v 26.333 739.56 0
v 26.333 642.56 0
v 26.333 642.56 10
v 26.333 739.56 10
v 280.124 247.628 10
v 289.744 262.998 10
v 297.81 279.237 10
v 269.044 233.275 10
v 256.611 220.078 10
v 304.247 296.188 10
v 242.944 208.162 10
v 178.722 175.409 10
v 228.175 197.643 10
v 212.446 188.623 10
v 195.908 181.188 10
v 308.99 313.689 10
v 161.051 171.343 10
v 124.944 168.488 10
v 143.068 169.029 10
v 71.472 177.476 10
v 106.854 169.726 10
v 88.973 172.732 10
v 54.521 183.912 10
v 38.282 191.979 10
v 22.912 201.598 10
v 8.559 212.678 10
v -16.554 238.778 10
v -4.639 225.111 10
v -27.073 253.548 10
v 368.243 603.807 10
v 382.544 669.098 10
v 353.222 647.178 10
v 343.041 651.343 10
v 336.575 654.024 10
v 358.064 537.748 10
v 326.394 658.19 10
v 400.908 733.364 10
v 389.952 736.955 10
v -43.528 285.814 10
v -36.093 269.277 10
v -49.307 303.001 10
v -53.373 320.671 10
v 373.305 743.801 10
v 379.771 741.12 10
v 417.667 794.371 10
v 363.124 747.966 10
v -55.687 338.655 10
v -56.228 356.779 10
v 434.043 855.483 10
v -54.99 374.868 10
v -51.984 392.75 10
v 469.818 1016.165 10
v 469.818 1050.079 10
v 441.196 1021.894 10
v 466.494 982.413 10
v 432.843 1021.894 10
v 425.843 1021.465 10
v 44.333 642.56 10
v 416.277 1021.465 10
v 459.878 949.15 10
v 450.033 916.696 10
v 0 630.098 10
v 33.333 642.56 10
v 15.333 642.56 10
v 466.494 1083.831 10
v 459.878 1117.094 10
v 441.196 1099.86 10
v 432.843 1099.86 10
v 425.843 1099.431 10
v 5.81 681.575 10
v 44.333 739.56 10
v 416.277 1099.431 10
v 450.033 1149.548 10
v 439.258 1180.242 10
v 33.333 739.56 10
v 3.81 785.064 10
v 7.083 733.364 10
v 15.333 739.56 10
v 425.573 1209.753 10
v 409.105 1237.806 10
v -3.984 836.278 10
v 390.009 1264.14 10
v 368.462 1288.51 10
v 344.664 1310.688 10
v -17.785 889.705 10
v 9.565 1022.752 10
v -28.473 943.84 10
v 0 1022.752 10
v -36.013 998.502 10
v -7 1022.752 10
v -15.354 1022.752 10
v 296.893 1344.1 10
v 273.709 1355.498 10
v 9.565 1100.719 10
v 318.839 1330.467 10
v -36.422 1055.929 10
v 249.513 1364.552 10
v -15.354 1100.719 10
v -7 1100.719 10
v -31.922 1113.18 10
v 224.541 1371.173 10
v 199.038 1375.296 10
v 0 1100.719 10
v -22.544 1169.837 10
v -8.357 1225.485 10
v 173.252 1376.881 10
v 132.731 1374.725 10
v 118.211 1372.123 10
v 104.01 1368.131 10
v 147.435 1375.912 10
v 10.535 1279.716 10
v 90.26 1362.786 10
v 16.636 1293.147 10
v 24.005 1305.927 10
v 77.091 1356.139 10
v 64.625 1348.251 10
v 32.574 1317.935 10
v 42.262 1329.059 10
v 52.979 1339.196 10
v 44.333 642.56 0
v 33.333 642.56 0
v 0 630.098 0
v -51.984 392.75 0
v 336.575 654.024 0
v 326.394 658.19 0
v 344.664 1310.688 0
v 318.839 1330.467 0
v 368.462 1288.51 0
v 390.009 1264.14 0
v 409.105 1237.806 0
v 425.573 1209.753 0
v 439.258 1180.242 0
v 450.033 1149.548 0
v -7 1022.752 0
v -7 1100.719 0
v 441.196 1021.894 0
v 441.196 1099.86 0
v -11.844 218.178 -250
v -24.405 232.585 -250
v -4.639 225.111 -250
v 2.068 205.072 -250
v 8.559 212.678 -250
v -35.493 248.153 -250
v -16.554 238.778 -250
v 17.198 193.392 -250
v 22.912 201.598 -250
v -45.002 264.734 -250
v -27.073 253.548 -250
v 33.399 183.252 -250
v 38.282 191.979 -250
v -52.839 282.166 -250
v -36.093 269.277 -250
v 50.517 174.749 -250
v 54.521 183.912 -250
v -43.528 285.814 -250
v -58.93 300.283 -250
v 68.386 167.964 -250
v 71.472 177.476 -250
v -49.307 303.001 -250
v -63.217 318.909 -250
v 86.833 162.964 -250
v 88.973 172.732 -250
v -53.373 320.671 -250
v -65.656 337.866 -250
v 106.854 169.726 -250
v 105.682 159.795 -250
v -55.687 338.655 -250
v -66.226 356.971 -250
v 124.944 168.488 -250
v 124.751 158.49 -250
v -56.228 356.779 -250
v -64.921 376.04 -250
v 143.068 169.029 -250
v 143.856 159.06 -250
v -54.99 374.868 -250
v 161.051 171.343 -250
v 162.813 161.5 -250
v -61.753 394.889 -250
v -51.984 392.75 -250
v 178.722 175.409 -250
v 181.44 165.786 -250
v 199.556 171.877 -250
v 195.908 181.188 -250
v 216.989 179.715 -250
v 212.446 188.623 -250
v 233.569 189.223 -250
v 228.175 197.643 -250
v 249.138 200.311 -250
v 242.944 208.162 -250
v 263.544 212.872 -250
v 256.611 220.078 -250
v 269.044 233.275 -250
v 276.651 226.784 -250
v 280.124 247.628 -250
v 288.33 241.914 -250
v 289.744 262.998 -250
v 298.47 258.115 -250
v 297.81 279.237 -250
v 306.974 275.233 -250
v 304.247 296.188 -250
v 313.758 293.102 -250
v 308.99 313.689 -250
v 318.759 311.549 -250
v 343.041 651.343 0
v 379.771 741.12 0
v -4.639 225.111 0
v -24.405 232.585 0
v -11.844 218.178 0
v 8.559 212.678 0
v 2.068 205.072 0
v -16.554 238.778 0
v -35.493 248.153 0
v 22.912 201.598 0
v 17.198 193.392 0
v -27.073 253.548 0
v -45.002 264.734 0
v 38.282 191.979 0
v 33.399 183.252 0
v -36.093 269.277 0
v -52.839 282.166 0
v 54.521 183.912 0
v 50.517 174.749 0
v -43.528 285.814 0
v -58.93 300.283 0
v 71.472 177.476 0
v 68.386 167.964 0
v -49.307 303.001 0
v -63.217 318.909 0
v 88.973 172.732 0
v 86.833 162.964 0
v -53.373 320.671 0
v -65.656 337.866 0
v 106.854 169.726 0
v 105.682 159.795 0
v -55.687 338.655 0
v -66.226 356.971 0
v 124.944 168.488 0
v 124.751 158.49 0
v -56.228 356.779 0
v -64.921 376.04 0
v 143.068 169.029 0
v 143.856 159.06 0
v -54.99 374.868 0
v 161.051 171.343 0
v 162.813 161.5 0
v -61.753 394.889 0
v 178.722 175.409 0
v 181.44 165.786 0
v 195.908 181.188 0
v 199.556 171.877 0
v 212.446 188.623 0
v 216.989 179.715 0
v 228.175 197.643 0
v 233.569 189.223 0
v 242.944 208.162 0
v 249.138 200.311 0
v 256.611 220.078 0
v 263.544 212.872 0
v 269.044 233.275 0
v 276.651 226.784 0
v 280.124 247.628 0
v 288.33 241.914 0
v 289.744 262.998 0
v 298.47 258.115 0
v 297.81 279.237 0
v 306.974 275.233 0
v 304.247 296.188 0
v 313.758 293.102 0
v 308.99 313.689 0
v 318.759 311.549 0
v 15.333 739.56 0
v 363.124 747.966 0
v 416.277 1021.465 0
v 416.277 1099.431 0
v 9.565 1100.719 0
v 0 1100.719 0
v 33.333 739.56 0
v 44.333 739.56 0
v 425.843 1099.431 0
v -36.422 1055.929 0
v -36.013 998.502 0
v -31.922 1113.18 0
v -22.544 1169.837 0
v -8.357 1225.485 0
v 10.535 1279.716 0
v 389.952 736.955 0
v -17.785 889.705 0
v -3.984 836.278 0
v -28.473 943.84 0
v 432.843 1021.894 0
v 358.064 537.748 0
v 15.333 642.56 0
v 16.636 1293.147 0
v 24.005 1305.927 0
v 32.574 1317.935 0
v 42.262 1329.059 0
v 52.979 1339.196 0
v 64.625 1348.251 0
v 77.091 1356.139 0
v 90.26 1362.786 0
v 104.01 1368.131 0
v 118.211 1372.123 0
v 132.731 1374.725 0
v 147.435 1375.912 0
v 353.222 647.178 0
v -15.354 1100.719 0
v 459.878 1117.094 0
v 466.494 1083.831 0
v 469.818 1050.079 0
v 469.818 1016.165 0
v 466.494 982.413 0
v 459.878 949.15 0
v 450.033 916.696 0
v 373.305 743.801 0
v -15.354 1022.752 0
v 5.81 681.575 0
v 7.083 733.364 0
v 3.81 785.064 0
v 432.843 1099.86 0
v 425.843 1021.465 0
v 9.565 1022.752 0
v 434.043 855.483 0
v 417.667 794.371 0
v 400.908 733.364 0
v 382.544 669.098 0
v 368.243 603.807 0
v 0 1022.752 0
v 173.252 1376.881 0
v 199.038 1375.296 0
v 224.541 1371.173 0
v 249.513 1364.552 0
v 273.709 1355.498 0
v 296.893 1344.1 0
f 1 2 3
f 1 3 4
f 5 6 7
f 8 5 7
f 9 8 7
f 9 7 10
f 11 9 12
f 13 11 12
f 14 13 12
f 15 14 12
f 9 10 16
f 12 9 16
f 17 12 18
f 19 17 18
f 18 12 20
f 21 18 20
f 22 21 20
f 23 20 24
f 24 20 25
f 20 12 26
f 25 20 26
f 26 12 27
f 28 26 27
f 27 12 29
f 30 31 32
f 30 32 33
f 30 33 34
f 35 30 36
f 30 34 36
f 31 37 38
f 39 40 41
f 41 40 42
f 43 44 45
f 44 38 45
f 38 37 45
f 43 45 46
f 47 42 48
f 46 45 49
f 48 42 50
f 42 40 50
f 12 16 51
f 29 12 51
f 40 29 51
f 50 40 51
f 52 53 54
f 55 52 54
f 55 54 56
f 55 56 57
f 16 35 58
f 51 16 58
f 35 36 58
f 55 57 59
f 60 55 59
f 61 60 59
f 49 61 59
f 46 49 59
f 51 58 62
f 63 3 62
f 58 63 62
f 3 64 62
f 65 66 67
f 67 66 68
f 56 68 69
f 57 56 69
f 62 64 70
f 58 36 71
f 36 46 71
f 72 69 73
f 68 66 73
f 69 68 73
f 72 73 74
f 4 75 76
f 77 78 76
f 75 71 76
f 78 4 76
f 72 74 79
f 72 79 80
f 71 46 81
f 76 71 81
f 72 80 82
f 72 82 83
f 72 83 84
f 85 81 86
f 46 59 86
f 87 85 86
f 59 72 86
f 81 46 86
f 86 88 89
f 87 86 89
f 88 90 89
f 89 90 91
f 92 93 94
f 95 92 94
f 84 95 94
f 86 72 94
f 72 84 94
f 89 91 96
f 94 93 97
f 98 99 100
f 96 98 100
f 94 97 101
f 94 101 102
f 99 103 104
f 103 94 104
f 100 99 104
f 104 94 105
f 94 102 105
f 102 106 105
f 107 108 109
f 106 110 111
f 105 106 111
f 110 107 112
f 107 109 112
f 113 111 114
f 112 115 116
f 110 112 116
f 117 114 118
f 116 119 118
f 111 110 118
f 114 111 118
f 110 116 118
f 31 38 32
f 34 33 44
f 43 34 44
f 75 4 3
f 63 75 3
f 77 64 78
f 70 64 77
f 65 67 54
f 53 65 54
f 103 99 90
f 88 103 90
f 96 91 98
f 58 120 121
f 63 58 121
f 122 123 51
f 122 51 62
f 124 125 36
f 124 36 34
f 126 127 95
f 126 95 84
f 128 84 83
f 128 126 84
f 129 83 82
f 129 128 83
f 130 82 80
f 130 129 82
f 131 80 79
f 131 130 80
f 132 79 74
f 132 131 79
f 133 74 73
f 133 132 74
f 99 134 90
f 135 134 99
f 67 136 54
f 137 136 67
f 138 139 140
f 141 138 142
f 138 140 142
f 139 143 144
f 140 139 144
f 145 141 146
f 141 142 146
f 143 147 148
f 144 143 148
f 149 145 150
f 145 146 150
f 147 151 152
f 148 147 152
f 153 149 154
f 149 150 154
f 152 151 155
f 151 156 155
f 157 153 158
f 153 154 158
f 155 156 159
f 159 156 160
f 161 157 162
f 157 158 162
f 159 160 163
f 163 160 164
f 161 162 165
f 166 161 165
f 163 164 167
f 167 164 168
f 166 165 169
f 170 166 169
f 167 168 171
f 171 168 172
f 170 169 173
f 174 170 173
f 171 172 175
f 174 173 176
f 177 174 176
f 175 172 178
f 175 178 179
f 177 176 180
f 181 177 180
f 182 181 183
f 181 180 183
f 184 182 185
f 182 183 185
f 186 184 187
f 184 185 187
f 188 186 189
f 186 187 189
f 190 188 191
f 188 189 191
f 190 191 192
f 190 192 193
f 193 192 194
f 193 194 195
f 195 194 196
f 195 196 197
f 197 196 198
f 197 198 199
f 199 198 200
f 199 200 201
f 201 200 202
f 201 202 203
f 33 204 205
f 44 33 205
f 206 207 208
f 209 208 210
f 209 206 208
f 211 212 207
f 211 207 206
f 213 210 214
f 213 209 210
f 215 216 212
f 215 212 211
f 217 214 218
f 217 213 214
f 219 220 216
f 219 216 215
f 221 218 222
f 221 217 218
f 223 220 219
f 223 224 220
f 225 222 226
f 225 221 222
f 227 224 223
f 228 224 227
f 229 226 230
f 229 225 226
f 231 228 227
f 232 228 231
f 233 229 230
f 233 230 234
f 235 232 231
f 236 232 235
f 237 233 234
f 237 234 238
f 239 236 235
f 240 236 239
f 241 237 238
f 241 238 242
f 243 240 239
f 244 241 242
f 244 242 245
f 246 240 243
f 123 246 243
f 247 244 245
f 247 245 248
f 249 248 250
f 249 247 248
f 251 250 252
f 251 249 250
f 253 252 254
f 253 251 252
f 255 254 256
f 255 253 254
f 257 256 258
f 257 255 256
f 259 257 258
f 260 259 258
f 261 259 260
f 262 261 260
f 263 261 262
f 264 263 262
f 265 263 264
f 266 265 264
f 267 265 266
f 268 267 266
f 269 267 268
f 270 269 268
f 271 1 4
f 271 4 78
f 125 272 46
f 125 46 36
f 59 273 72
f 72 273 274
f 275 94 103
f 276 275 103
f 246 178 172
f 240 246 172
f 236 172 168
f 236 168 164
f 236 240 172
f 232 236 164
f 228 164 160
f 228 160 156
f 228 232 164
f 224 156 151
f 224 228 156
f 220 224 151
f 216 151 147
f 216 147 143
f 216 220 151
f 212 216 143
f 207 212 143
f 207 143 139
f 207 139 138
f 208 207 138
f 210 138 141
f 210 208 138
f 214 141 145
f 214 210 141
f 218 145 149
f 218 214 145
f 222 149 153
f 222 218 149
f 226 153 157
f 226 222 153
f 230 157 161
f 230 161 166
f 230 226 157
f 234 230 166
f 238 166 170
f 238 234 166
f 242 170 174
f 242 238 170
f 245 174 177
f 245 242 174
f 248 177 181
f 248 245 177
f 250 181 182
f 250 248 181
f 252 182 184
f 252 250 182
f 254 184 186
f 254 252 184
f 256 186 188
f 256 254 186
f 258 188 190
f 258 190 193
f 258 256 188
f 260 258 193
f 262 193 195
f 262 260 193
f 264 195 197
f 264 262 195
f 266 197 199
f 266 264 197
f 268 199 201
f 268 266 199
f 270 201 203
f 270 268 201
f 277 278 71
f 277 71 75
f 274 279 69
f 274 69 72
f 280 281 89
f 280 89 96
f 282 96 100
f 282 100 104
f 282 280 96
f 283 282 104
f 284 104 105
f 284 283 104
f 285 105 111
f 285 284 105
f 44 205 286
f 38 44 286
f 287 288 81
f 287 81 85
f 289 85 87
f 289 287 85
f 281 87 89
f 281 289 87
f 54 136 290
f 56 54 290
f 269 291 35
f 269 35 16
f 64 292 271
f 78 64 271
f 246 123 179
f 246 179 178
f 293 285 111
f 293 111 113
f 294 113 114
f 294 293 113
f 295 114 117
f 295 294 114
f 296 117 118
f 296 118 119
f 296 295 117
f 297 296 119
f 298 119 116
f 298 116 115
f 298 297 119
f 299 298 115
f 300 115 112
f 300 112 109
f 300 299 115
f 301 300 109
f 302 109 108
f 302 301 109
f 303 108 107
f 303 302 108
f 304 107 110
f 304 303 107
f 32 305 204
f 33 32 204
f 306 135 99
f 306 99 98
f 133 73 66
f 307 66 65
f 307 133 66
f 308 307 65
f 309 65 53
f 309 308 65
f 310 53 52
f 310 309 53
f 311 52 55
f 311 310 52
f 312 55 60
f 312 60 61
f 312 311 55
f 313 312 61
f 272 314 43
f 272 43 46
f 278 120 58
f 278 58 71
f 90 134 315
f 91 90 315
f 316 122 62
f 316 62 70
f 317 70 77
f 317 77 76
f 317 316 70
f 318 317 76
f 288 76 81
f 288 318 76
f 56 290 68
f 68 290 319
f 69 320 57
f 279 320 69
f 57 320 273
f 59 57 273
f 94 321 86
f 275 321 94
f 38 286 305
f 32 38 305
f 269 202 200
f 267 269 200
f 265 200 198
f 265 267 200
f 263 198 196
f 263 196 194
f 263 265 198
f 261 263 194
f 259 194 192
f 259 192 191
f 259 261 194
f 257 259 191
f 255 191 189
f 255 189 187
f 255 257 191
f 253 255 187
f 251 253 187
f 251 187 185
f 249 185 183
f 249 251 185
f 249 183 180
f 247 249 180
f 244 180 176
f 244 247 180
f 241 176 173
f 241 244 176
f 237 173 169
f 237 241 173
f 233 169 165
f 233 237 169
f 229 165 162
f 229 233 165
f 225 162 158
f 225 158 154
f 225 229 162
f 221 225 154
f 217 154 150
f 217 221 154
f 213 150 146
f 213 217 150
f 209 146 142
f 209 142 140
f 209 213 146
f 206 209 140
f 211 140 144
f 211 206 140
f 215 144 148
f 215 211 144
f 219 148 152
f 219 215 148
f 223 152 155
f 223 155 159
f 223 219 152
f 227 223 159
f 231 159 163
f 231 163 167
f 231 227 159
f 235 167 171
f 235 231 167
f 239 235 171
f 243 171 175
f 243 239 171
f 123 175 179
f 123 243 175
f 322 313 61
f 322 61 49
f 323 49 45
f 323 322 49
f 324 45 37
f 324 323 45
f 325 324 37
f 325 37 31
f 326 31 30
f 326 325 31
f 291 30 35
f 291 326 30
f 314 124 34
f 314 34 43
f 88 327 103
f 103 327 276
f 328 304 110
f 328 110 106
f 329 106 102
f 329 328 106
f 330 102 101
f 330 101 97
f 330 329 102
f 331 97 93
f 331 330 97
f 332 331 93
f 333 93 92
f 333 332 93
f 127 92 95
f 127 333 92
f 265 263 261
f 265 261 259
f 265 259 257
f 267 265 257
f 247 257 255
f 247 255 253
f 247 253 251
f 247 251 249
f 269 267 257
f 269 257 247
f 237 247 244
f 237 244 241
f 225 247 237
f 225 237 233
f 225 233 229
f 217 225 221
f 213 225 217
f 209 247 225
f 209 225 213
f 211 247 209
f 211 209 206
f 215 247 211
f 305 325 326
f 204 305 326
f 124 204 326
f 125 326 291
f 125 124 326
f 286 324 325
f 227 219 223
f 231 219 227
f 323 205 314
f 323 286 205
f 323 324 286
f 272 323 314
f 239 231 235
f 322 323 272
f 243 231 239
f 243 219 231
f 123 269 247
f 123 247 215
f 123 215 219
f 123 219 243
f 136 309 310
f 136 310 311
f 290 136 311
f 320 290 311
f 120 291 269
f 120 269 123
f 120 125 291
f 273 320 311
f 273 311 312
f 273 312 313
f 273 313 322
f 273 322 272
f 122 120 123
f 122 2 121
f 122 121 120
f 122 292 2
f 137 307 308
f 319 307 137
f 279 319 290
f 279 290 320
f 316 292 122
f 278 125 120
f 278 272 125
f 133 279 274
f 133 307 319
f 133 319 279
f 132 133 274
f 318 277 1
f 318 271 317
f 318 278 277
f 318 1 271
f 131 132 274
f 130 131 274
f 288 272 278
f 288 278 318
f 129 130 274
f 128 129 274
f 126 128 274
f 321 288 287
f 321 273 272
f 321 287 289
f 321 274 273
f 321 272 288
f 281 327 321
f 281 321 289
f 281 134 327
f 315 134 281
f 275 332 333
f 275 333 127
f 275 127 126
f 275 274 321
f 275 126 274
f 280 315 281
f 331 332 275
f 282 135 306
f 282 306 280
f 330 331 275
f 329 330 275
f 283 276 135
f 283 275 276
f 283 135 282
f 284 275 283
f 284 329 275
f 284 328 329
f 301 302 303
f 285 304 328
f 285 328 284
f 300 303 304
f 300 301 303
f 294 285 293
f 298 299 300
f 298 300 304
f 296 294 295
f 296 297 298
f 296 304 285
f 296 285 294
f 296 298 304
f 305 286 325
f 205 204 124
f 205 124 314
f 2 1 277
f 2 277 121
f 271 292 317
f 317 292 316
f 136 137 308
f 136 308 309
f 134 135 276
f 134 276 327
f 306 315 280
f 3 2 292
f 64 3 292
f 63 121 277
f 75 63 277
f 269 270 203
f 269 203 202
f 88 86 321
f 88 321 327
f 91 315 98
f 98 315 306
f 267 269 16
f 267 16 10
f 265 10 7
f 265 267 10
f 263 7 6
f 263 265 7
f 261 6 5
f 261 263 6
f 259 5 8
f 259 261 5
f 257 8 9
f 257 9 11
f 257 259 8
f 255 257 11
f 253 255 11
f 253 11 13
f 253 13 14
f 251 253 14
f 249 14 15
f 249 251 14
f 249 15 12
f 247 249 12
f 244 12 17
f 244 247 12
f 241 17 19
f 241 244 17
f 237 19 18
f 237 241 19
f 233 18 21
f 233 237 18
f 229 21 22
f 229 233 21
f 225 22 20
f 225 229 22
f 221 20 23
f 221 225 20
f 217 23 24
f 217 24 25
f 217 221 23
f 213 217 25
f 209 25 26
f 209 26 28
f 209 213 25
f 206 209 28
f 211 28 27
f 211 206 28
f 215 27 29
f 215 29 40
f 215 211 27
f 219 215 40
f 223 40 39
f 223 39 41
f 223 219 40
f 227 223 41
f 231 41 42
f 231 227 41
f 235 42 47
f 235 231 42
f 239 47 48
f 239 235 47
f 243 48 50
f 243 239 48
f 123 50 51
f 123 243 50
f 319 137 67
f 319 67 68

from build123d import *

# Parameters (mm, degrees)
BOSS_EXTRUDE1_DEPTH = 10
BOSS_EXTRUDE2_DEPTH = 250
SKETCH3_W           = 9.565213244
SKETCH3_H           = 77.966410476
SKETCH3_W_2         = 8.353543979
SKETCH3_H_2         = 77.966410475
CUT_EXTRUDE1_DEPTH  = 250
SKETCH4_W           = 11
SKETCH4_H           = 97
CUT_EXTRUDE2_DEPTH  = 250


with BuildPart() as part:
    # Sketch1 → Boss-Extrude1 (new body)
    with BuildSketch(Plane.XY):
        with BuildLine():
            Line((-51.984126252, 392.74957316), (0, 630.098149599))
            ThreePointArc((0, 630.098149599), (7.08288491, 733.363548715), (-3.984096645, 836.278231013))
            ThreePointArc((-3.984096645, 836.278231013), (-23.520457502, 916.694909006), (-36.012597338, 998.502353272))
            ThreePointArc((-36.012597338, 998.502353272), (-27.83897086, 1141.608720593), (10.535208392, 1279.716153066))
            ThreePointArc((10.535208392, 1279.716153066), (64.625002116, 1348.250843062), (147.435292888, 1375.912463775))
            ThreePointArc((147.435292888, 1375.912463775), (237.109169245, 1368.171524242), (318.838797646, 1330.467491469))
            ThreePointArc((318.838797646, 1330.467491469), (399.875156257, 1251.203752857), (450.033178317, 1149.548430819))
            ThreePointArc((450.033178317, 1149.548430819), (470.234397487, 1033.122029824), (450.033178317, 916.695628829))
            ThreePointArc((450.033178317, 916.695628829), (425.902967507, 824.914102712), (400.908098576, 733.364268538))
            ThreePointArc((400.908098576, 733.364268538), (374.881556851, 636.564375255), (358.063754215, 537.74756632))
            Line((358.063754215, 537.74756632), (308.99038073, 313.688874225))
            ThreePointArc((308.99038073, 313.688874225), (88.972777771, 172.731970202), (-51.984126252, 392.74957316))
        make_face()
    extrude(amount=BOSS_EXTRUDE1_DEPTH)

    # Sketch3 → Cut-Extrude1 (cut)
    with BuildSketch(Plane(origin=(0, 0, 0), x_dir=(-1, 0, 0), z_dir=(0, 0, -1))):
        with Locations((-4.782606622, 1061.735695438)):
            Rectangle(SKETCH3_W, SKETCH3_H)
        with Locations((11.17677199, 1061.735695438)):
            Rectangle(SKETCH3_W_2, SKETCH3_H)
        with Locations((-437.019311557, 1060.877248381)):
            Rectangle(SKETCH3_W_2, SKETCH3_H_2)
        with Locations((-421.059932945, 1060.448024852)):
            Rectangle(SKETCH3_W, SKETCH3_H_2)
    extrude(amount=-CUT_EXTRUDE1_DEPTH, mode=Mode.SUBTRACT)

    # Sketch4 → Cut-Extrude2 (cut)
    with BuildSketch(Plane(origin=(0, 0, 0), x_dir=(-1, 0, 0), z_dir=(0, 0, -1))):
        with Locations((-38.83297081, 691.059824561)):
            Rectangle(SKETCH4_W, SKETCH4_H)
        with Locations((-20.83297081, 691.059824561)):
            Rectangle(SKETCH4_W, SKETCH4_H)
        Polygon((-363.124216695, 747.966415693), (-326.394029606, 658.189506878), (-336.574916173, 654.024227929), (-373.305103262, 743.801136745), align=None)
        Polygon((-389.952232486, 736.954664741), (-353.222045397, 647.177755926), (-343.041158831, 651.343034874), (-379.77134592, 741.119943689), align=None)
    extrude(amount=-CUT_EXTRUDE2_DEPTH, mode=Mode.SUBTRACT)


with BuildPart() as body_2:
    # Sketch2 → Boss-Extrude2 (new body)
    with BuildSketch(Plane(origin=(0, 0, 0), x_dir=(-1, 0, 0), z_dir=(0, 0, -1))):
        with BuildLine():
            Line((-318.758829625, 311.549386859), (-308.99038073, 313.688874225))
            ThreePointArc((-308.99038073, 313.688874225), (-88.972777771, 172.731970202), (51.984126252, 392.74957316))
            Line((51.984126252, 392.74957316), (61.752575147, 394.889060526))
            ThreePointArc((61.752575147, 394.889060526), (-86.833290405, 162.963521307), (-318.758829625, 311.549386859))
        make_face()
    extrude(amount=BOSS_EXTRUDE2_DEPTH)


solid = Compound([part.part, body_2.part])
